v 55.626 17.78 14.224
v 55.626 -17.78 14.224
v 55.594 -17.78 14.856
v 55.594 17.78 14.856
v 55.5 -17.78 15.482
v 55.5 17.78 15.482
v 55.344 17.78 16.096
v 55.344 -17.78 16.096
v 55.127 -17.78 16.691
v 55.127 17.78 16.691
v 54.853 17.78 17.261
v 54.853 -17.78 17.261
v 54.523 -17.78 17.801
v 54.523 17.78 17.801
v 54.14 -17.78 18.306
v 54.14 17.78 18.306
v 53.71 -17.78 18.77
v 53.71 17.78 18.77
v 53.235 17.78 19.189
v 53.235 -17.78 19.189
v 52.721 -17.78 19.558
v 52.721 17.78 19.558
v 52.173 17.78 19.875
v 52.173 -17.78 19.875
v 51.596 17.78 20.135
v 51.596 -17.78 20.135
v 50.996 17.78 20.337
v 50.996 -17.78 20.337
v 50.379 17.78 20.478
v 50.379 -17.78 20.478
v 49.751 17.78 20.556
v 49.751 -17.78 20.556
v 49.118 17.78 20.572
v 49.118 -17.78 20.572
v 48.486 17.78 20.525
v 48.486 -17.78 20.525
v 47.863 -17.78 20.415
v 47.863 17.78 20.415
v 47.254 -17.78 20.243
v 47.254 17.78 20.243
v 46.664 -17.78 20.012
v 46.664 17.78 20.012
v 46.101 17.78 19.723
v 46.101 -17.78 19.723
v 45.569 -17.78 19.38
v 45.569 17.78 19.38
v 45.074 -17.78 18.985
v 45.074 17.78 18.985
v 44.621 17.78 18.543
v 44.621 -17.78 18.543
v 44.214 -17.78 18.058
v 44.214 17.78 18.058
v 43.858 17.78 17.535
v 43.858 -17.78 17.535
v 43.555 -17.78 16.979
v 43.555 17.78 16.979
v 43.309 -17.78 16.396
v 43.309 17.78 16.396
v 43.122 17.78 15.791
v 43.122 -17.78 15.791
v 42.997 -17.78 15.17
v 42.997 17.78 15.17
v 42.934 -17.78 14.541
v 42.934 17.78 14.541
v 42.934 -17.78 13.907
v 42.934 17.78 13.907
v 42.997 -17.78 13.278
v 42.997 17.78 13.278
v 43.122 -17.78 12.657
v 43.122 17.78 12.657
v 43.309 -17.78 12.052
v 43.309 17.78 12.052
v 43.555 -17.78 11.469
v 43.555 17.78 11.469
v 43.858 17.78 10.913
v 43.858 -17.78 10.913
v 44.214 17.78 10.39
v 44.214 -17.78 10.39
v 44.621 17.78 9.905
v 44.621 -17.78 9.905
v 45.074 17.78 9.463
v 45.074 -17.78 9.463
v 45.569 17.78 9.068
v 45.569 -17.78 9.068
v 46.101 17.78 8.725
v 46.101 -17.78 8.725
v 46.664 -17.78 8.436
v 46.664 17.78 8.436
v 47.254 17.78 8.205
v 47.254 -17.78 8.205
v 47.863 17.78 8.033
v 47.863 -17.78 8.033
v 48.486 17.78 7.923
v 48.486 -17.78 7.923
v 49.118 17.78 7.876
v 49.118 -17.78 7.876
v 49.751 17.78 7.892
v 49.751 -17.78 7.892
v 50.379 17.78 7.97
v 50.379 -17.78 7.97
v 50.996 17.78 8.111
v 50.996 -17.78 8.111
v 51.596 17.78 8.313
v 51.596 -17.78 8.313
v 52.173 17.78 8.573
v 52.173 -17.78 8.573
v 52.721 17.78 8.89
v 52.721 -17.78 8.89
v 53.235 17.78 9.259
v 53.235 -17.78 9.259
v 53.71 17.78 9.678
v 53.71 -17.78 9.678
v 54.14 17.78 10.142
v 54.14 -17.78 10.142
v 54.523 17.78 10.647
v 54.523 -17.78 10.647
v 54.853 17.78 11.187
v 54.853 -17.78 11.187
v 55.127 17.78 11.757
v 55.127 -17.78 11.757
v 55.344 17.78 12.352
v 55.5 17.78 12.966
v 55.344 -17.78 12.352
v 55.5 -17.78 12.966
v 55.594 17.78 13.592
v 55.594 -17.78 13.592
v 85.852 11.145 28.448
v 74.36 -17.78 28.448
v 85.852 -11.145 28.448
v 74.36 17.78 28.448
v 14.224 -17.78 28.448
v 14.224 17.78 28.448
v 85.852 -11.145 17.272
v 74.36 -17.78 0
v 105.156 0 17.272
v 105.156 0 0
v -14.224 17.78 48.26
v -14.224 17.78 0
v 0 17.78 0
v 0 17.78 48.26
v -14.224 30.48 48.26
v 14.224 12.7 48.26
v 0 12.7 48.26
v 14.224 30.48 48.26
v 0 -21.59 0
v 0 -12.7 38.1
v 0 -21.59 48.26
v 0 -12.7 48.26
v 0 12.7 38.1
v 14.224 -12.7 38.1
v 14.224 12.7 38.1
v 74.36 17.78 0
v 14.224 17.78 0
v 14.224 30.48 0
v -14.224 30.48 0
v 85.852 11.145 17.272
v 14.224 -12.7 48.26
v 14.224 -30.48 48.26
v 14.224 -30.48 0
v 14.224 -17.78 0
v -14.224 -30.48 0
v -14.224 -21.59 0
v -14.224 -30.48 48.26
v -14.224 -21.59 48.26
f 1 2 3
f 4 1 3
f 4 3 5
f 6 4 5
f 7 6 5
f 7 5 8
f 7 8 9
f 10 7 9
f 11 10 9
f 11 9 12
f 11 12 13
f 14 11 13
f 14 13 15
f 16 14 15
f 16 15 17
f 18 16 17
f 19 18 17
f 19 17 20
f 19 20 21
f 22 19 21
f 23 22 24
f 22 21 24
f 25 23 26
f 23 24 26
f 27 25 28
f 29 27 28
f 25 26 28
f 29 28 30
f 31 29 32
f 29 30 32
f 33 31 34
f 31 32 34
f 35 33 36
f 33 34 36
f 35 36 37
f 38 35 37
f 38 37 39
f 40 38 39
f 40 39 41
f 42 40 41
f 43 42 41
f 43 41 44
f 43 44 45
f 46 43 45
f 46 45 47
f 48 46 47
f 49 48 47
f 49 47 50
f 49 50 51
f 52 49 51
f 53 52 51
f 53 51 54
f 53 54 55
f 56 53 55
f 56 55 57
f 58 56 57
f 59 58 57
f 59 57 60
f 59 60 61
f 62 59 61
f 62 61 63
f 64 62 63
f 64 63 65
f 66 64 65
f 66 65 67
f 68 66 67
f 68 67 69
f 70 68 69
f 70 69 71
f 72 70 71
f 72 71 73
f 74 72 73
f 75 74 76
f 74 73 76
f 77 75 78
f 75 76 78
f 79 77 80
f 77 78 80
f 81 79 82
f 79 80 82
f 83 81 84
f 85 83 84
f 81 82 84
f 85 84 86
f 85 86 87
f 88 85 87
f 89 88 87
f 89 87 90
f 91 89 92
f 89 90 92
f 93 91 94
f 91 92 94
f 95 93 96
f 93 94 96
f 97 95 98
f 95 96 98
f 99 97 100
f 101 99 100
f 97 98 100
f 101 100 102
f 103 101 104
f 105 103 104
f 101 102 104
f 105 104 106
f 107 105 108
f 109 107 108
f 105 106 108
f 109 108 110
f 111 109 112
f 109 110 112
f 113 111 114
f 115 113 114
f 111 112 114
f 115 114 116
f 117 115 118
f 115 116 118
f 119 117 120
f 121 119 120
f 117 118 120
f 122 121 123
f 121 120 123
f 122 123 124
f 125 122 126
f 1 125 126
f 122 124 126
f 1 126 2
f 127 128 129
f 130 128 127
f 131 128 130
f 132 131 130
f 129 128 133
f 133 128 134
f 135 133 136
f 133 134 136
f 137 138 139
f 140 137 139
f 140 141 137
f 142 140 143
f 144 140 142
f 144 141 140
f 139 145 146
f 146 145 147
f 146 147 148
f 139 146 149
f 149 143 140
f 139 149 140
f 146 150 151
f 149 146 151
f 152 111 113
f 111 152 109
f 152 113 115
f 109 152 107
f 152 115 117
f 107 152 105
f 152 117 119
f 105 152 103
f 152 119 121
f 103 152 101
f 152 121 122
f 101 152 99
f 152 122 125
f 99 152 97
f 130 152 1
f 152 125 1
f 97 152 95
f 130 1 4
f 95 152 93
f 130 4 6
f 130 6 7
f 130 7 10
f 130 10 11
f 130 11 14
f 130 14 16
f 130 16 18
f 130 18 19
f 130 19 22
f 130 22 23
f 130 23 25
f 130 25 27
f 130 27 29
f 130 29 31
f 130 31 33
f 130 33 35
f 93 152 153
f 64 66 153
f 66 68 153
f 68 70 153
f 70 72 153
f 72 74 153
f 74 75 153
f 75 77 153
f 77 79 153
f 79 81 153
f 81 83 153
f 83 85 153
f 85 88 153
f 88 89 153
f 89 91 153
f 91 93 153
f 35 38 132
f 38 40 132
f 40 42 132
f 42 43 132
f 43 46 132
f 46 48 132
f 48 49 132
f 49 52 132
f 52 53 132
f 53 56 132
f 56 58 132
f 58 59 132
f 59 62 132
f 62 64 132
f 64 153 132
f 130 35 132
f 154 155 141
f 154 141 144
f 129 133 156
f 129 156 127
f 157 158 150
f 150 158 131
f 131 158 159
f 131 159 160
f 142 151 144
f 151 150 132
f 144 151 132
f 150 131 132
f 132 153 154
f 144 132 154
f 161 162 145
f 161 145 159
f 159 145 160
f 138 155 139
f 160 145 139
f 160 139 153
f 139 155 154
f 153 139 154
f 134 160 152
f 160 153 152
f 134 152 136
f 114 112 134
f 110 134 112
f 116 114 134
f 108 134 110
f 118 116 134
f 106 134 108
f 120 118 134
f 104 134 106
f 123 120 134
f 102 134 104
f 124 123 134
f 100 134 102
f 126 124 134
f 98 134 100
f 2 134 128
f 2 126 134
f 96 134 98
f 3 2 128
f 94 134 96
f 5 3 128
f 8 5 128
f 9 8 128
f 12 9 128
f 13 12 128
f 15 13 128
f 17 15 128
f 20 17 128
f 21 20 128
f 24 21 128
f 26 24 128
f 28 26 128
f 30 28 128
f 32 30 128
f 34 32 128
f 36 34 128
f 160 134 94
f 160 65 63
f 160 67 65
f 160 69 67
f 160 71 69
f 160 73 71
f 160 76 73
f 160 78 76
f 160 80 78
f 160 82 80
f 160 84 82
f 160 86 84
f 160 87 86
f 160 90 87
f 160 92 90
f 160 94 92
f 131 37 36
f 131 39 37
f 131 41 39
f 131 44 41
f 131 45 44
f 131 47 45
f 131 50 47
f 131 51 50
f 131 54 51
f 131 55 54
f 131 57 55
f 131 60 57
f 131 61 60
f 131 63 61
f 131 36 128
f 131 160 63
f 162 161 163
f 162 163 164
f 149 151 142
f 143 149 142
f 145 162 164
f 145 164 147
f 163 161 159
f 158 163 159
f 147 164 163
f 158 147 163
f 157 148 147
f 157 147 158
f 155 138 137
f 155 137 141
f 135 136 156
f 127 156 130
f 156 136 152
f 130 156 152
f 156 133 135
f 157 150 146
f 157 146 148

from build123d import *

# Parameters (mm, degrees)
F0_W      = 28.448
F0_H      = 60.96
F1_DEPTH  = 48.26
F2_W      = 25.4
F2_H      = 10.16
F3_DEPTH  = 28.449
F4_W      = 14.224
F4_H      = 39.37
F5_DEPTH  = 48.261
F6_W      = 35.56
F6_H      = 28.448
F7_DEPTH  = 90.932
F8_W      = 19.304
F8_H      = 11.176
F9_DEPTH  = 48.261
F11_DEPTH = 48.261
F12_R     = 6.35
F13_DEPTH = 48.261


with BuildPart() as f1:
    # F0 (on Top) → F1 (new body)
    with BuildSketch(Plane.XY):
        Rectangle(F0_W, F0_H)
    extrude(amount=F1_DEPTH)

    # F2 (on face) → F3 (cut, through all)
    with BuildSketch(Plane.YZ.offset(14.224)):
        with Locations((0, 43.18)):
            Rectangle(F2_W, F2_H)
    extrude(amount=-F3_DEPTH, mode=Mode.SUBTRACT)

    # F4 (on face) → F5 (cut, through all)
    with BuildSketch(Plane.XY.offset(48.26)):
        with Locations((-7.112, -1.905)):
            Rectangle(F4_W, F4_H)
    extrude(amount=-F5_DEPTH, mode=Mode.SUBTRACT)

    # F6 (on face) → F7 (join)
    with BuildSketch(Plane.YZ.offset(14.224)):
        with Locations((0, 14.224)):
            Rectangle(F6_W, F6_H)
    extrude(amount=F7_DEPTH)

    # F8 (on face) → F9 (cut, through all)
    with BuildSketch(Plane.XZ.offset(17.78)):
        with Locations((95.504, 22.86)):
            Rectangle(F8_W, F8_H)
    extrude(amount=-F9_DEPTH, mode=Mode.SUBTRACT)

    # F10 (on face) → F11 (cut, through all)
    with BuildSketch(Plane(origin=(0, 0, 0), x_dir=(1, 0, 0), z_dir=(0, 0, -1))):
        Polygon((74.360137, 17.78), (105.156, 0), (105.156, 17.78), align=None)
        Polygon((105.156, -17.78), (105.156, 0), (74.360137, -17.78), align=None)
    extrude(amount=-F11_DEPTH, mode=Mode.SUBTRACT)

    # F12 (on face) → F13 (cut, through all)
    with BuildSketch(Plane.XZ.offset(17.78)):
        with Locations((49.276, 14.224)):
            Circle(F12_R)
    extrude(amount=-F13_DEPTH, mode=Mode.SUBTRACT)


solid = f1.part
